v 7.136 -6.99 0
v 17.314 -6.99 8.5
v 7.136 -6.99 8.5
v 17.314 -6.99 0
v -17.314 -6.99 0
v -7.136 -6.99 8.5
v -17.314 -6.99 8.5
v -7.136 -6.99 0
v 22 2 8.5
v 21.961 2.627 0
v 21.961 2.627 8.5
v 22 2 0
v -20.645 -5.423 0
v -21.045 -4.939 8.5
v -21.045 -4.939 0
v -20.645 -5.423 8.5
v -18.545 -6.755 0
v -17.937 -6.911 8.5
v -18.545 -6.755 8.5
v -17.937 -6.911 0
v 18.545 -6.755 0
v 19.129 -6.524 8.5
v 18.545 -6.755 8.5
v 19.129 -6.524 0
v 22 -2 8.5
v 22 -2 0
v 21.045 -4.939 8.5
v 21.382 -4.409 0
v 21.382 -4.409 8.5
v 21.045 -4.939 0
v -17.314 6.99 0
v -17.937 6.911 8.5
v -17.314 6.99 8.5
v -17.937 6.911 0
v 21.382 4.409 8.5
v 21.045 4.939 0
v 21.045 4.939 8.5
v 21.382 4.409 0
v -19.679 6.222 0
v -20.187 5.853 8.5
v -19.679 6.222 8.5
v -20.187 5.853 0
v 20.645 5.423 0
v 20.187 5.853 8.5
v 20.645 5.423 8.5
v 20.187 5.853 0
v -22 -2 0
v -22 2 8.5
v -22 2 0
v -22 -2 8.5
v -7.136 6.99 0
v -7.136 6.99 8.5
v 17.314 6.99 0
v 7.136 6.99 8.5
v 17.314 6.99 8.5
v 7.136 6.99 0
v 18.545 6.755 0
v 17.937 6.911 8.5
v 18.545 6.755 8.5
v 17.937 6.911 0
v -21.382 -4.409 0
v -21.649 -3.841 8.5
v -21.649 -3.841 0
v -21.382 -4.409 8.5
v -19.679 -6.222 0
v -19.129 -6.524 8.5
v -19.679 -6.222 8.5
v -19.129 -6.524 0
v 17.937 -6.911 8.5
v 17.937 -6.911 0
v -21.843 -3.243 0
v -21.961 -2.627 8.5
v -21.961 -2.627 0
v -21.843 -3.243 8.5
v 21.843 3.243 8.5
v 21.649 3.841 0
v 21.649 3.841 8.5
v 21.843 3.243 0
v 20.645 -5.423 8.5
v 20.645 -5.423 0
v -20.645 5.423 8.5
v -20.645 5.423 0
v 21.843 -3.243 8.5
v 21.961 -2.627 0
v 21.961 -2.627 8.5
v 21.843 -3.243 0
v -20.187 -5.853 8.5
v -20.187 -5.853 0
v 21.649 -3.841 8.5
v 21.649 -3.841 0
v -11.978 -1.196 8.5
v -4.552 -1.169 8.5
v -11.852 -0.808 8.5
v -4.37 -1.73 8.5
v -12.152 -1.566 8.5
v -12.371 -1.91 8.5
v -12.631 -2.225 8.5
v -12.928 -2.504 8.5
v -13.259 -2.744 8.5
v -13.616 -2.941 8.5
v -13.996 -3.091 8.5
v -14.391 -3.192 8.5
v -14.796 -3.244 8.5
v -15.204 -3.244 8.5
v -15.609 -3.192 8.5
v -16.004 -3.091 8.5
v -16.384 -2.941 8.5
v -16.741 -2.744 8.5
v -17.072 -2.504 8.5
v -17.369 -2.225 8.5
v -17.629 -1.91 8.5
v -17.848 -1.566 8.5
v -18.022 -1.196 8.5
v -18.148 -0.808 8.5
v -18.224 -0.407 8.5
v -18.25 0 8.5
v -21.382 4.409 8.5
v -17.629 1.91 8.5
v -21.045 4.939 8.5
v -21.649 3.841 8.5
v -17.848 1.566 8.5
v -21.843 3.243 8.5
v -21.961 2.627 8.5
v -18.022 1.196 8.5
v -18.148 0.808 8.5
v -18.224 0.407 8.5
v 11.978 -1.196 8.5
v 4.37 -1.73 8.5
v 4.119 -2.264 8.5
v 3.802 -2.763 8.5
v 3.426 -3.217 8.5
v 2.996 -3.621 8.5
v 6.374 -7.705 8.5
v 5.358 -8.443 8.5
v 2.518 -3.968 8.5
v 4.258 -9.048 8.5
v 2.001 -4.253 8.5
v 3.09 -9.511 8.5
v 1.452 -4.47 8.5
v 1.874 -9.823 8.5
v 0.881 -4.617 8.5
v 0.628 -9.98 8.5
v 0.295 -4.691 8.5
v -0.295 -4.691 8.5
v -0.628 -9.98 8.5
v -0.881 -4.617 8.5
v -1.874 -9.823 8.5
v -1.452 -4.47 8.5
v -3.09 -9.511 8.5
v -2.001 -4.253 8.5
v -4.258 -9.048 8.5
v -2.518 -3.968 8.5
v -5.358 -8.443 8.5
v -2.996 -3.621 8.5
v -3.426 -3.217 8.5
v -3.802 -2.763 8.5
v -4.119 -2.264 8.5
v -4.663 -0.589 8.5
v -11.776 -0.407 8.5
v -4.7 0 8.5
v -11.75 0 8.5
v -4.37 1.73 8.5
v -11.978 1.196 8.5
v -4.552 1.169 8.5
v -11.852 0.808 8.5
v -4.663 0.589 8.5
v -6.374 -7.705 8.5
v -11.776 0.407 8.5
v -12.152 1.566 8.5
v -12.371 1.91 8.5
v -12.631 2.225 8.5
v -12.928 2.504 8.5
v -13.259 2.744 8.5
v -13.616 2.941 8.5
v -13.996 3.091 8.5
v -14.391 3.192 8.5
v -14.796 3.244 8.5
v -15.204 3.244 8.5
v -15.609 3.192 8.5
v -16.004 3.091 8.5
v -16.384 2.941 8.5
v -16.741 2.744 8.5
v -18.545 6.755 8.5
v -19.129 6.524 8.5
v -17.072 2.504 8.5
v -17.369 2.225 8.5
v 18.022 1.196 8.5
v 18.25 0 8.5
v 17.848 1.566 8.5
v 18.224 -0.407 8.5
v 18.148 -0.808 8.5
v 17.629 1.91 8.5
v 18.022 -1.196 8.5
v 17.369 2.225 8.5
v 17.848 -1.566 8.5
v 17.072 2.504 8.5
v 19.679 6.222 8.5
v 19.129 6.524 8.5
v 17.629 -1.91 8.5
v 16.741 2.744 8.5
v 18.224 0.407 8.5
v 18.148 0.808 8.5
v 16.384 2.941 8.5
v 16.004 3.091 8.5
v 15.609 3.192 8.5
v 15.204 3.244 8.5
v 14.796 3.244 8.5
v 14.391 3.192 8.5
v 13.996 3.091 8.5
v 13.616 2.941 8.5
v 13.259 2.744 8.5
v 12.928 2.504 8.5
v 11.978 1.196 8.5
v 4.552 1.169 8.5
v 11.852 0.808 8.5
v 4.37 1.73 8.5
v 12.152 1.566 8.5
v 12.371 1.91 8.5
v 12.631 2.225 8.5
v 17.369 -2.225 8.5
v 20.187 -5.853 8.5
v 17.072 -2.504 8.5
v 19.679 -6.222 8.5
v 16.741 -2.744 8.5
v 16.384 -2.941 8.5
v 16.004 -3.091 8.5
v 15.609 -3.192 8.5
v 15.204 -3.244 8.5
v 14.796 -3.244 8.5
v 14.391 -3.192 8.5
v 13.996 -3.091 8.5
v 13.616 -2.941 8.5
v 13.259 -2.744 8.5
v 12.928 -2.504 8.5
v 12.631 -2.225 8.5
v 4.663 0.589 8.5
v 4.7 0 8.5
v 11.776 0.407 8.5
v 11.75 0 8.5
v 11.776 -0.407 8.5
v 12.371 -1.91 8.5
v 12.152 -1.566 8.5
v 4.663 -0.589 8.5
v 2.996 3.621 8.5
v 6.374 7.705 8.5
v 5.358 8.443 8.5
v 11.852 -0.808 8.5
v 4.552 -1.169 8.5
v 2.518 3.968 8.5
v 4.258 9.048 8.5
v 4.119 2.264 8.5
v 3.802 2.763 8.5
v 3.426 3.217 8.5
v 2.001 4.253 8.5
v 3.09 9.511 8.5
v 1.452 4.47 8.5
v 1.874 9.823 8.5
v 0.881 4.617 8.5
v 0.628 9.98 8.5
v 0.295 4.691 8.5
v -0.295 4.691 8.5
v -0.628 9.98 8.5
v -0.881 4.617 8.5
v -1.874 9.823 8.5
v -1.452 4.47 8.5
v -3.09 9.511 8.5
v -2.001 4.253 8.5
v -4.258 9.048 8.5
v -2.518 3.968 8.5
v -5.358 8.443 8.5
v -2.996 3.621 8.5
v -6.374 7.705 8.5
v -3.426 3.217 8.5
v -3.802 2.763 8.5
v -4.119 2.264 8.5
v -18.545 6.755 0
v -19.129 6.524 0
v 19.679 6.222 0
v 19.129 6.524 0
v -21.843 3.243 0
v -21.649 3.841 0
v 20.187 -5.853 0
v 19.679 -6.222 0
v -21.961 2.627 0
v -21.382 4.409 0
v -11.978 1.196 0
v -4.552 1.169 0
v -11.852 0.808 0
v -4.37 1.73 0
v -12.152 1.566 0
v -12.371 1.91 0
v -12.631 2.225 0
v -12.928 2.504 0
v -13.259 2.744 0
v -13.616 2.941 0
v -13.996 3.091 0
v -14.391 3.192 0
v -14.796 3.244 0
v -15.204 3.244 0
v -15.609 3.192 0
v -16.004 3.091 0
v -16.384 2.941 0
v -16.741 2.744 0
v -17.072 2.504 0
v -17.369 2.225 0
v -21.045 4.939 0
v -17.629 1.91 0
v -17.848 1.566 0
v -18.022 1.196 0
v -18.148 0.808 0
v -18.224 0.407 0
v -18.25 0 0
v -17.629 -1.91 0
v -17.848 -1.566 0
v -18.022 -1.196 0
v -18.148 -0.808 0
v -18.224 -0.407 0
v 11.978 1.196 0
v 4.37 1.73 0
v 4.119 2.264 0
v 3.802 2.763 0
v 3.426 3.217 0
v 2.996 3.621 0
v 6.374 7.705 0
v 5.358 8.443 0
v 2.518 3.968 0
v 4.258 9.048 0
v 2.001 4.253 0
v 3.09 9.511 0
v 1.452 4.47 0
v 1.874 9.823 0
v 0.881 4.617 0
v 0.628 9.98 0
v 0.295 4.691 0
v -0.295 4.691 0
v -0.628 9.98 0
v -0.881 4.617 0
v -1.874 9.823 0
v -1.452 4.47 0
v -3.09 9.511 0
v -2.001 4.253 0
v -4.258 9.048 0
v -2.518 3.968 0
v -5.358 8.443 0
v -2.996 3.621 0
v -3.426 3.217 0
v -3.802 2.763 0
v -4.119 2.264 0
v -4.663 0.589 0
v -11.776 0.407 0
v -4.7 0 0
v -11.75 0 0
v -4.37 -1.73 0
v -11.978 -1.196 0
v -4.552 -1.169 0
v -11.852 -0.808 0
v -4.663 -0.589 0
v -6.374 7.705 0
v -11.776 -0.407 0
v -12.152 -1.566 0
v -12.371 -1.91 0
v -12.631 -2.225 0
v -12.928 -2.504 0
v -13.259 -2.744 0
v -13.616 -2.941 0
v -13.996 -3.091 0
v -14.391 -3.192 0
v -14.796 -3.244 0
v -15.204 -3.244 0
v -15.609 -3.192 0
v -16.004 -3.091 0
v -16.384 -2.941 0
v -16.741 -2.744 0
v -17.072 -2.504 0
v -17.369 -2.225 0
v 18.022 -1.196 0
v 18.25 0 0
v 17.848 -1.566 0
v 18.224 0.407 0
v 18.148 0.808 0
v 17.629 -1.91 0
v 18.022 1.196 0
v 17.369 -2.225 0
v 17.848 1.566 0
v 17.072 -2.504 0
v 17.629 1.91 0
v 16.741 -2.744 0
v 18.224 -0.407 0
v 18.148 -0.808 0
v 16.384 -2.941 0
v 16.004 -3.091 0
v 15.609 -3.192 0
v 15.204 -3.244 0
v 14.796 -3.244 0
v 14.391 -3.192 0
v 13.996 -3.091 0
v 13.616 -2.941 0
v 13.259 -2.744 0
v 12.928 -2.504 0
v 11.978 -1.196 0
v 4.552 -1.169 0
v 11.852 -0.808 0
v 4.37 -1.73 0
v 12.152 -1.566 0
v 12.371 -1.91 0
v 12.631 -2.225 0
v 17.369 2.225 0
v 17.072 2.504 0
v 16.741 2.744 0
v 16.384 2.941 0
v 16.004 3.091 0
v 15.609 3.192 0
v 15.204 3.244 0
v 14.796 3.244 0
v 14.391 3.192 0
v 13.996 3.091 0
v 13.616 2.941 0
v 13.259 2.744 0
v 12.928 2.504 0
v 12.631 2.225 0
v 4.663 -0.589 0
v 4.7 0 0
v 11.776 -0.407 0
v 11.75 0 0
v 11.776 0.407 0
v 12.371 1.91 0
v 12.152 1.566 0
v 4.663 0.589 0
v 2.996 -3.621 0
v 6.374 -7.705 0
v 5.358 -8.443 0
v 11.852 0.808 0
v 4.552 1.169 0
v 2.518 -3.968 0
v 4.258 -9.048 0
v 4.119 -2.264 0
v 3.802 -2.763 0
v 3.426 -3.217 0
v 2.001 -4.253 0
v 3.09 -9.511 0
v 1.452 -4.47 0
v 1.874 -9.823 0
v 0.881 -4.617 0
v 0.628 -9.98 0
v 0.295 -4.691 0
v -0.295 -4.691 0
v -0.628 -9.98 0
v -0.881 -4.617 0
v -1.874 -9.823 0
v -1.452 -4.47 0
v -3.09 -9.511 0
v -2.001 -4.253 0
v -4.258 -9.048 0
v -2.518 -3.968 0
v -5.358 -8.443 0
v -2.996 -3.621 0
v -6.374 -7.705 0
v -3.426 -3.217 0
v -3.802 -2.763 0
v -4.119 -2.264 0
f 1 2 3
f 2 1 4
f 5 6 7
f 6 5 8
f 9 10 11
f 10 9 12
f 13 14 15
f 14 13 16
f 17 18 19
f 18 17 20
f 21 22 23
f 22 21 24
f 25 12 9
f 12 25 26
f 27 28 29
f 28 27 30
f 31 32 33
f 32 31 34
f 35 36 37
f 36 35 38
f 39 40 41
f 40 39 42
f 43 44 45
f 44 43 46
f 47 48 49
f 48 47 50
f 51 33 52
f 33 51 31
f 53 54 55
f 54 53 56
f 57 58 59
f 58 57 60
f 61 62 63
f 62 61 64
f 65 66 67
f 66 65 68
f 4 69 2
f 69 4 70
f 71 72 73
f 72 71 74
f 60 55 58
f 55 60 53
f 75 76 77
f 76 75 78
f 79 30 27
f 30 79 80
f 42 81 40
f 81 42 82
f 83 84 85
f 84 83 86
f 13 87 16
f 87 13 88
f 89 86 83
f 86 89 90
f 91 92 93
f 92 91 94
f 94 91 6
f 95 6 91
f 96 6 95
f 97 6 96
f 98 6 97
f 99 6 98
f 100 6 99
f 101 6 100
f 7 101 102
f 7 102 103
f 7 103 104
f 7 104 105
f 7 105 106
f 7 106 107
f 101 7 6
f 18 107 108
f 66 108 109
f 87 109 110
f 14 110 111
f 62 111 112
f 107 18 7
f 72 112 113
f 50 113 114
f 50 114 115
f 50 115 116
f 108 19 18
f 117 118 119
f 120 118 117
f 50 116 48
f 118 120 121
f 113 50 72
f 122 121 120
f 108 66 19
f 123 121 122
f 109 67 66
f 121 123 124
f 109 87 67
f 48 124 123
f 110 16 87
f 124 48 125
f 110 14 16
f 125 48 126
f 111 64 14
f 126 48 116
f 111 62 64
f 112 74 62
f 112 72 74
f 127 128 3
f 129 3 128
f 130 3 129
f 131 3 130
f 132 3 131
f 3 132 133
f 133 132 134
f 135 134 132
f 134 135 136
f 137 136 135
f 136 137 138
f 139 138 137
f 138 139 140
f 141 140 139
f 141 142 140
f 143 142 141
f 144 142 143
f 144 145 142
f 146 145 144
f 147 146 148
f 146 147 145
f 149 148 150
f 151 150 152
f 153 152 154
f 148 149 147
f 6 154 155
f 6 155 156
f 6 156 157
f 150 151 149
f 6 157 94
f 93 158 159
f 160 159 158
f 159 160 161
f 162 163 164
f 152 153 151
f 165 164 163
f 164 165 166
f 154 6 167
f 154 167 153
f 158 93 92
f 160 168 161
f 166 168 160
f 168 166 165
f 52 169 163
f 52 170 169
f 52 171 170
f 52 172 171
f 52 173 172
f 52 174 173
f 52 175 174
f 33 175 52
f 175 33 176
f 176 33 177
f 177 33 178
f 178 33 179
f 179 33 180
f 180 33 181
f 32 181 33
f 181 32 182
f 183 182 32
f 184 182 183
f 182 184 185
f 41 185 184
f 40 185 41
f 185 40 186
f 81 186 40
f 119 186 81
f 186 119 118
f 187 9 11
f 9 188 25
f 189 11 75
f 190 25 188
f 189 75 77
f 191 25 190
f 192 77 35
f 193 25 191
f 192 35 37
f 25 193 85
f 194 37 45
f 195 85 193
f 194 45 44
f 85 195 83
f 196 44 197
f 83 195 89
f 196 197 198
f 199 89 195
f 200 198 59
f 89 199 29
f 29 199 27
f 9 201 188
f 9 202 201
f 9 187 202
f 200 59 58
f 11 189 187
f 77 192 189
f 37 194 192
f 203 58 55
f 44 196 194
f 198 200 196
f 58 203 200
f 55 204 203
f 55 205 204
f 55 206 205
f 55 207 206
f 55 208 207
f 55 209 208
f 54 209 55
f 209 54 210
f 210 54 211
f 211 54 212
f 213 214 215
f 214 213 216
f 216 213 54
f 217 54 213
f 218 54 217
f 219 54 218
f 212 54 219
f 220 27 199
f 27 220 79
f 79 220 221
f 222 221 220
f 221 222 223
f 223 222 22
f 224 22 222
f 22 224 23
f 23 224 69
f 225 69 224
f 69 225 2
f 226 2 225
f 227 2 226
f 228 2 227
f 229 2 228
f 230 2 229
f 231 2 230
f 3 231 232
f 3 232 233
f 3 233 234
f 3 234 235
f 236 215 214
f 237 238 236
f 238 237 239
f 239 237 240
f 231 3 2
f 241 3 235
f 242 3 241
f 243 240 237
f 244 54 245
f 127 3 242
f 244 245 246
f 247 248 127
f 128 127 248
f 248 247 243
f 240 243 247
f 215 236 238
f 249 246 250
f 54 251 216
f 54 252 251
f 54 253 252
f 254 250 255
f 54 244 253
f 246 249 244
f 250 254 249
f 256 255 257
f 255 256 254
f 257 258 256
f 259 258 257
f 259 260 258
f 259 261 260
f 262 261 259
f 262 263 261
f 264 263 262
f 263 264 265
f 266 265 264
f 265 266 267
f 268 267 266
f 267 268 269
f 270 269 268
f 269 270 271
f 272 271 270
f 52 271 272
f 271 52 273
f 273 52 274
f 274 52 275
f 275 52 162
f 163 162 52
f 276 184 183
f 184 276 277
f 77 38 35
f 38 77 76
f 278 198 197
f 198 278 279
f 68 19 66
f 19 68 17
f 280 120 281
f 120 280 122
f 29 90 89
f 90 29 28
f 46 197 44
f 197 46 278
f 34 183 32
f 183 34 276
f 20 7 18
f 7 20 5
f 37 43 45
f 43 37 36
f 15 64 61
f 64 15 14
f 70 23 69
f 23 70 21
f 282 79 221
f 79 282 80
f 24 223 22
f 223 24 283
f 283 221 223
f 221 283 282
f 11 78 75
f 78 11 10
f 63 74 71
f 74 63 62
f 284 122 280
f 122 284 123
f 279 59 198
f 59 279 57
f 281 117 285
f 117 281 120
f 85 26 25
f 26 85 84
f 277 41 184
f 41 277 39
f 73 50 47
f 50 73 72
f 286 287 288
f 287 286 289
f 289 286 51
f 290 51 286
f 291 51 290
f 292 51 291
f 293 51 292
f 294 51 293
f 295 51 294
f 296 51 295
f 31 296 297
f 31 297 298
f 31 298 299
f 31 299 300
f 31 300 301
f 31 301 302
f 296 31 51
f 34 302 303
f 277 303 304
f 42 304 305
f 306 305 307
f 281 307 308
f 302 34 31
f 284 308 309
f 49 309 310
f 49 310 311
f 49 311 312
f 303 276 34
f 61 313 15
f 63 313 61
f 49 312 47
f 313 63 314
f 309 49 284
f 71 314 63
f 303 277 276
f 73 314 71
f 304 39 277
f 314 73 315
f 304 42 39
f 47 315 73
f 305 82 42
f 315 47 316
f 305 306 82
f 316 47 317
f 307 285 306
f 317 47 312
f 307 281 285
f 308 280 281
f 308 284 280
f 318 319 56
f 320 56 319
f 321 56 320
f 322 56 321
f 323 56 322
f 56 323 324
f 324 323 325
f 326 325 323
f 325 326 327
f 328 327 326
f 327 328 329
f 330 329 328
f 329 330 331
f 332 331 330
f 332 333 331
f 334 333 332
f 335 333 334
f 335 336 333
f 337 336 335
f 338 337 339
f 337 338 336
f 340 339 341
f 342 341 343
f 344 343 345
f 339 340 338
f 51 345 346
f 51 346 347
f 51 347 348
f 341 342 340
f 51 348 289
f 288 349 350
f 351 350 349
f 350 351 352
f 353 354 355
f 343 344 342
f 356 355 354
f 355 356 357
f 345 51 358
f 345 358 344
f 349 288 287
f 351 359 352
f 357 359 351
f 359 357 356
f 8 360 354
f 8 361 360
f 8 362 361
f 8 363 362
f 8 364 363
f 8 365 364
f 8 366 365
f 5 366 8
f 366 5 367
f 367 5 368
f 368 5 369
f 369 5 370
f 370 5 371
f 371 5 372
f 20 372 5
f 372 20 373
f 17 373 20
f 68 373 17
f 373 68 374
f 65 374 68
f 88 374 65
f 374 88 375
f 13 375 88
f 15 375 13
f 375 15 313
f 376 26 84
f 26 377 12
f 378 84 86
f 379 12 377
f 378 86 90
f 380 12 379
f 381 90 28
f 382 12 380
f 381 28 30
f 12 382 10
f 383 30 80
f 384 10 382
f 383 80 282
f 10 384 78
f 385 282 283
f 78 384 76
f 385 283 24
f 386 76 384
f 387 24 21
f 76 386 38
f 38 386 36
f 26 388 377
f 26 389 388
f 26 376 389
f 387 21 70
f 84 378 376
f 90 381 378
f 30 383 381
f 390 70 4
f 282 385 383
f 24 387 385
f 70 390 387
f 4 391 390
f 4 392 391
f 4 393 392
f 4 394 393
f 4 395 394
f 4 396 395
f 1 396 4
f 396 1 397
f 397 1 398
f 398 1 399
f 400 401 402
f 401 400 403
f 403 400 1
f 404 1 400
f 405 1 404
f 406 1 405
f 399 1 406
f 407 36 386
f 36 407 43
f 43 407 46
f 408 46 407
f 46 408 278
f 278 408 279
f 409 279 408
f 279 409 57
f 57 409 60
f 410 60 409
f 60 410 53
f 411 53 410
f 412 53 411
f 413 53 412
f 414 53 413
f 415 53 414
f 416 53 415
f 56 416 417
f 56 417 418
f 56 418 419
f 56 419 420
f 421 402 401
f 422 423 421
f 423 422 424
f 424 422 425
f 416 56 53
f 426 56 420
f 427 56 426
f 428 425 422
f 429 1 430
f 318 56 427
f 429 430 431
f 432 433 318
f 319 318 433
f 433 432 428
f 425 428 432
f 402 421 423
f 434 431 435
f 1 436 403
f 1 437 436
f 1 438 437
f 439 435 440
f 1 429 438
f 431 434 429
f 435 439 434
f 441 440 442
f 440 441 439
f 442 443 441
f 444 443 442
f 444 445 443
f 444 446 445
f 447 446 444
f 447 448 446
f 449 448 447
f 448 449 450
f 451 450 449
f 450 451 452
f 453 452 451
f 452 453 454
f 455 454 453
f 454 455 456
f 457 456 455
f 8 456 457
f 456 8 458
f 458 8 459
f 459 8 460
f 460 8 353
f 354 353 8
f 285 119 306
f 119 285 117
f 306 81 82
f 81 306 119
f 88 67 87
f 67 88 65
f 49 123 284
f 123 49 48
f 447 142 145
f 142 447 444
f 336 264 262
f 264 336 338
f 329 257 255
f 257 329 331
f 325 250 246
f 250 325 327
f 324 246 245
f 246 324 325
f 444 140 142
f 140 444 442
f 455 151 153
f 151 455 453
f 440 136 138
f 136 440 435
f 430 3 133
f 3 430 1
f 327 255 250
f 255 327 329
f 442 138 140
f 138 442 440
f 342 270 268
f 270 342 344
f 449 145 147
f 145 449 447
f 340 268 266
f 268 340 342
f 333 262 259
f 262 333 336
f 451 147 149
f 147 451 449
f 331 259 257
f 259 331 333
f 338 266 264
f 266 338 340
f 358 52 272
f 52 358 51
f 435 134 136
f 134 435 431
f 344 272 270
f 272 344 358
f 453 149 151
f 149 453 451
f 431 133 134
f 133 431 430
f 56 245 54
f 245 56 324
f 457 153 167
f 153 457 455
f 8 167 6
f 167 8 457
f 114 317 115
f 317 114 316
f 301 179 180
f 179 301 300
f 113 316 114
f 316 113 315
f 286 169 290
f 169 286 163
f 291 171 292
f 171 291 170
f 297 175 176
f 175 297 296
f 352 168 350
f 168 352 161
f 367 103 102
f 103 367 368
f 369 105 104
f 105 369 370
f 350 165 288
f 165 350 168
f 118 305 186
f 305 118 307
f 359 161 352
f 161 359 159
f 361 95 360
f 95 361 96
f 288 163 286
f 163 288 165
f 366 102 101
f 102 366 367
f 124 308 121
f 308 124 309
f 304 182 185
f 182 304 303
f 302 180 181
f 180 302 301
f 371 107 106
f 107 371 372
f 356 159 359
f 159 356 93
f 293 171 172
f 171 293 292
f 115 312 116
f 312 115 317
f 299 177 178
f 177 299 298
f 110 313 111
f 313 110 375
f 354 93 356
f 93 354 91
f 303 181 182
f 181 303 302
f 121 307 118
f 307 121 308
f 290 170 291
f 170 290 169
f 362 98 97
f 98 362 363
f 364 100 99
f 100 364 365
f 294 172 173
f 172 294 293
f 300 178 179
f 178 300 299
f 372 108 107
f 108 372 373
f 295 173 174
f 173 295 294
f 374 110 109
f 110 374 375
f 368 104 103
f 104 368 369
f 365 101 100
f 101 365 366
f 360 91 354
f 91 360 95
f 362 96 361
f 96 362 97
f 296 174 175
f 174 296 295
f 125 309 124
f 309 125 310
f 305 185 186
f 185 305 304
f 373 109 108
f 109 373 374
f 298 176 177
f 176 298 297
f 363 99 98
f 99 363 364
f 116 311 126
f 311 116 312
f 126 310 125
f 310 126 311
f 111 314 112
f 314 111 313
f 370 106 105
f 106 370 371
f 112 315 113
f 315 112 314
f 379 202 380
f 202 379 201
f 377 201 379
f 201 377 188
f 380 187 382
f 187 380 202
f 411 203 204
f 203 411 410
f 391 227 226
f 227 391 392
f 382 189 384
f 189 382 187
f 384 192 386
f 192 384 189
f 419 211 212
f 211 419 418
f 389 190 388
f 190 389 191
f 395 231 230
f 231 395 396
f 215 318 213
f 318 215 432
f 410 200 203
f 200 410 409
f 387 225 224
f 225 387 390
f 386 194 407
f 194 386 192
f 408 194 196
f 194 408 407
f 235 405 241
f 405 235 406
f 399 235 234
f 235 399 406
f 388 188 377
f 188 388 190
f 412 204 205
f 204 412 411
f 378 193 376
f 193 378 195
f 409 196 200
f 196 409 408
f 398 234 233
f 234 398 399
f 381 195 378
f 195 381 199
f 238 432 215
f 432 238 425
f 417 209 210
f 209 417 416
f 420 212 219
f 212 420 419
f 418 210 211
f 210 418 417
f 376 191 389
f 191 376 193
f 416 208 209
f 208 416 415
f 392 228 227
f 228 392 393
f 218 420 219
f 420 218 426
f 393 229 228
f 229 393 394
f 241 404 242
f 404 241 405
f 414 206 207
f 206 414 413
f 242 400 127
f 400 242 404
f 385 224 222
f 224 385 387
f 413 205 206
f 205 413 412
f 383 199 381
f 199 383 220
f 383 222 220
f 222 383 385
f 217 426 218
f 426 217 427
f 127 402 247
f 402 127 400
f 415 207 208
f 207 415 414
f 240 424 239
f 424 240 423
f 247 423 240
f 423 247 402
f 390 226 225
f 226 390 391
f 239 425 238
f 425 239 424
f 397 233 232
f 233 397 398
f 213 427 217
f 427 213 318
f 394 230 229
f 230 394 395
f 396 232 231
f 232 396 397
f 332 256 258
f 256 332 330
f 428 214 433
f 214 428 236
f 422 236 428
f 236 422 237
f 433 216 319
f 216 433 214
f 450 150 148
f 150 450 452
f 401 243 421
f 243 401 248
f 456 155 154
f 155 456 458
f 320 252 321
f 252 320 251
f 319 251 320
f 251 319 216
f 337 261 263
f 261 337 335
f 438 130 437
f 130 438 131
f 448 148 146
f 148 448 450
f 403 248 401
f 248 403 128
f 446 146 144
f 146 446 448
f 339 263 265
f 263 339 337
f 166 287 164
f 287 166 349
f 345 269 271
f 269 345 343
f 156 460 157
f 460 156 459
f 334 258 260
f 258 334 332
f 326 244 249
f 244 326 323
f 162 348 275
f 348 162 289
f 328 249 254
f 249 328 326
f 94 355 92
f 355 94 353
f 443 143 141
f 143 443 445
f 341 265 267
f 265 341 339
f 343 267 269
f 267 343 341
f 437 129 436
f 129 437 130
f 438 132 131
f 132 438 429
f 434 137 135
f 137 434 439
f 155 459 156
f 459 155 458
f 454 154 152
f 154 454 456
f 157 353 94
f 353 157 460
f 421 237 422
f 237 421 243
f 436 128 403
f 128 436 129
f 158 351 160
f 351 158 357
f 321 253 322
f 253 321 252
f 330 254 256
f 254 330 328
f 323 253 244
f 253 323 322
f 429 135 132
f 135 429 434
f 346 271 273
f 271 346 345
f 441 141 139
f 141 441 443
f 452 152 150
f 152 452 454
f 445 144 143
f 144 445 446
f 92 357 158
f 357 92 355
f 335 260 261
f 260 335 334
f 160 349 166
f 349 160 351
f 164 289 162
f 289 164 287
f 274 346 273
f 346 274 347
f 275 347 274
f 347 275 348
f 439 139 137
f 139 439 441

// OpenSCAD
$fn = 50;


difference() {
	union() {
		*color(alpha = 1.0000000000, c = "gray") {
			translate(v = [0, 7, 0]) {
				linear_extrude(height = 1) {
					text(font = "Arial:style=Bold", halign = "center", size = 4.5000000000, text = "COMMENT plate main", valign = "center");
				}
			}
		}
		*color(alpha = 1.0000000000, c = "gray") {
			translate(v = [0, 14, 0]) {
				linear_extrude(height = 1) {
					text(font = "Arial:style=Bold", halign = "center", size = 4.5000000000, text = "COMMENT description oobb_plate_shape_p_type_8.5_depth_3_width_1_height_8.5_thickness_slip_center_extra", valign = "center");
				}
			}
		}
		hull() {
			translate(v = [-17.0000000000, 2.0000000000, 0]) {
				cylinder(h = 8.5000000000, r = 5);
			}
			translate(v = [17.0000000000, 2.0000000000, 0]) {
				cylinder(h = 8.5000000000, r = 5);
			}
			translate(v = [-17.0000000000, -2.0000000000, 0]) {
				cylinder(h = 8.5000000000, r = 5);
			}
			translate(v = [17.0000000000, -2.0000000000, 0]) {
				cylinder(h = 8.5000000000, r = 5);
			}
		}
		cylinder(h = 8.5000000000, r = 10.0000000000);
	}
	union() {
		*color(alpha = 1.0000000000, c = "gray") {
			translate(v = [0, 7, 0]) {
				linear_extrude(height = 1) {
					text(font = "Arial:style=Bold", halign = "center", size = 4.5000000000, text = "COMMENT holes main", valign = "center");
				}
			}
		}
		*color(alpha = 1.0000000000, c = "gray") {
			translate(v = [0, 14, 0]) {
				linear_extrude(height = 1) {
					text(font = "Arial:style=Bold", halign = "center", size = 4.5000000000, text = "COMMENT description oobb_holes_shape_n_type_3_width_1_height_8.5_thickness_slip_center_extra_false_both_holes", valign = "center");
				}
			}
		}
		translate(v = [-15.0000000000, 0.0000000000, 0]) {
			translate(v = [0, 0, -50]) {
				cylinder(h = 100, r = 3.2500000000);
			}
		}
		translate(v = [0, 0, -50]) {
			cylinder(h = 100, r = 3.2500000000);
		}
		translate(v = [15.0000000000, 0.0000000000, 0]) {
			translate(v = [0, 0, -50]) {
				cylinder(h = 100, r = 3.2500000000);
			}
		}
		*color(alpha = 1.0000000000, c = "gray") {
			translate(v = [0, 7, 0]) {
				linear_extrude(height = 1) {
					text(font = "Arial:style=Bold", halign = "center", size = 4.5000000000, text = "COMMENT extra slip_center", valign = "center");
				}
			}
		}
		translate(v = [0, 0, -50.0000000000]) {
			cylinder(h = 100, r = 4.7000000000);
		}
	}
}
